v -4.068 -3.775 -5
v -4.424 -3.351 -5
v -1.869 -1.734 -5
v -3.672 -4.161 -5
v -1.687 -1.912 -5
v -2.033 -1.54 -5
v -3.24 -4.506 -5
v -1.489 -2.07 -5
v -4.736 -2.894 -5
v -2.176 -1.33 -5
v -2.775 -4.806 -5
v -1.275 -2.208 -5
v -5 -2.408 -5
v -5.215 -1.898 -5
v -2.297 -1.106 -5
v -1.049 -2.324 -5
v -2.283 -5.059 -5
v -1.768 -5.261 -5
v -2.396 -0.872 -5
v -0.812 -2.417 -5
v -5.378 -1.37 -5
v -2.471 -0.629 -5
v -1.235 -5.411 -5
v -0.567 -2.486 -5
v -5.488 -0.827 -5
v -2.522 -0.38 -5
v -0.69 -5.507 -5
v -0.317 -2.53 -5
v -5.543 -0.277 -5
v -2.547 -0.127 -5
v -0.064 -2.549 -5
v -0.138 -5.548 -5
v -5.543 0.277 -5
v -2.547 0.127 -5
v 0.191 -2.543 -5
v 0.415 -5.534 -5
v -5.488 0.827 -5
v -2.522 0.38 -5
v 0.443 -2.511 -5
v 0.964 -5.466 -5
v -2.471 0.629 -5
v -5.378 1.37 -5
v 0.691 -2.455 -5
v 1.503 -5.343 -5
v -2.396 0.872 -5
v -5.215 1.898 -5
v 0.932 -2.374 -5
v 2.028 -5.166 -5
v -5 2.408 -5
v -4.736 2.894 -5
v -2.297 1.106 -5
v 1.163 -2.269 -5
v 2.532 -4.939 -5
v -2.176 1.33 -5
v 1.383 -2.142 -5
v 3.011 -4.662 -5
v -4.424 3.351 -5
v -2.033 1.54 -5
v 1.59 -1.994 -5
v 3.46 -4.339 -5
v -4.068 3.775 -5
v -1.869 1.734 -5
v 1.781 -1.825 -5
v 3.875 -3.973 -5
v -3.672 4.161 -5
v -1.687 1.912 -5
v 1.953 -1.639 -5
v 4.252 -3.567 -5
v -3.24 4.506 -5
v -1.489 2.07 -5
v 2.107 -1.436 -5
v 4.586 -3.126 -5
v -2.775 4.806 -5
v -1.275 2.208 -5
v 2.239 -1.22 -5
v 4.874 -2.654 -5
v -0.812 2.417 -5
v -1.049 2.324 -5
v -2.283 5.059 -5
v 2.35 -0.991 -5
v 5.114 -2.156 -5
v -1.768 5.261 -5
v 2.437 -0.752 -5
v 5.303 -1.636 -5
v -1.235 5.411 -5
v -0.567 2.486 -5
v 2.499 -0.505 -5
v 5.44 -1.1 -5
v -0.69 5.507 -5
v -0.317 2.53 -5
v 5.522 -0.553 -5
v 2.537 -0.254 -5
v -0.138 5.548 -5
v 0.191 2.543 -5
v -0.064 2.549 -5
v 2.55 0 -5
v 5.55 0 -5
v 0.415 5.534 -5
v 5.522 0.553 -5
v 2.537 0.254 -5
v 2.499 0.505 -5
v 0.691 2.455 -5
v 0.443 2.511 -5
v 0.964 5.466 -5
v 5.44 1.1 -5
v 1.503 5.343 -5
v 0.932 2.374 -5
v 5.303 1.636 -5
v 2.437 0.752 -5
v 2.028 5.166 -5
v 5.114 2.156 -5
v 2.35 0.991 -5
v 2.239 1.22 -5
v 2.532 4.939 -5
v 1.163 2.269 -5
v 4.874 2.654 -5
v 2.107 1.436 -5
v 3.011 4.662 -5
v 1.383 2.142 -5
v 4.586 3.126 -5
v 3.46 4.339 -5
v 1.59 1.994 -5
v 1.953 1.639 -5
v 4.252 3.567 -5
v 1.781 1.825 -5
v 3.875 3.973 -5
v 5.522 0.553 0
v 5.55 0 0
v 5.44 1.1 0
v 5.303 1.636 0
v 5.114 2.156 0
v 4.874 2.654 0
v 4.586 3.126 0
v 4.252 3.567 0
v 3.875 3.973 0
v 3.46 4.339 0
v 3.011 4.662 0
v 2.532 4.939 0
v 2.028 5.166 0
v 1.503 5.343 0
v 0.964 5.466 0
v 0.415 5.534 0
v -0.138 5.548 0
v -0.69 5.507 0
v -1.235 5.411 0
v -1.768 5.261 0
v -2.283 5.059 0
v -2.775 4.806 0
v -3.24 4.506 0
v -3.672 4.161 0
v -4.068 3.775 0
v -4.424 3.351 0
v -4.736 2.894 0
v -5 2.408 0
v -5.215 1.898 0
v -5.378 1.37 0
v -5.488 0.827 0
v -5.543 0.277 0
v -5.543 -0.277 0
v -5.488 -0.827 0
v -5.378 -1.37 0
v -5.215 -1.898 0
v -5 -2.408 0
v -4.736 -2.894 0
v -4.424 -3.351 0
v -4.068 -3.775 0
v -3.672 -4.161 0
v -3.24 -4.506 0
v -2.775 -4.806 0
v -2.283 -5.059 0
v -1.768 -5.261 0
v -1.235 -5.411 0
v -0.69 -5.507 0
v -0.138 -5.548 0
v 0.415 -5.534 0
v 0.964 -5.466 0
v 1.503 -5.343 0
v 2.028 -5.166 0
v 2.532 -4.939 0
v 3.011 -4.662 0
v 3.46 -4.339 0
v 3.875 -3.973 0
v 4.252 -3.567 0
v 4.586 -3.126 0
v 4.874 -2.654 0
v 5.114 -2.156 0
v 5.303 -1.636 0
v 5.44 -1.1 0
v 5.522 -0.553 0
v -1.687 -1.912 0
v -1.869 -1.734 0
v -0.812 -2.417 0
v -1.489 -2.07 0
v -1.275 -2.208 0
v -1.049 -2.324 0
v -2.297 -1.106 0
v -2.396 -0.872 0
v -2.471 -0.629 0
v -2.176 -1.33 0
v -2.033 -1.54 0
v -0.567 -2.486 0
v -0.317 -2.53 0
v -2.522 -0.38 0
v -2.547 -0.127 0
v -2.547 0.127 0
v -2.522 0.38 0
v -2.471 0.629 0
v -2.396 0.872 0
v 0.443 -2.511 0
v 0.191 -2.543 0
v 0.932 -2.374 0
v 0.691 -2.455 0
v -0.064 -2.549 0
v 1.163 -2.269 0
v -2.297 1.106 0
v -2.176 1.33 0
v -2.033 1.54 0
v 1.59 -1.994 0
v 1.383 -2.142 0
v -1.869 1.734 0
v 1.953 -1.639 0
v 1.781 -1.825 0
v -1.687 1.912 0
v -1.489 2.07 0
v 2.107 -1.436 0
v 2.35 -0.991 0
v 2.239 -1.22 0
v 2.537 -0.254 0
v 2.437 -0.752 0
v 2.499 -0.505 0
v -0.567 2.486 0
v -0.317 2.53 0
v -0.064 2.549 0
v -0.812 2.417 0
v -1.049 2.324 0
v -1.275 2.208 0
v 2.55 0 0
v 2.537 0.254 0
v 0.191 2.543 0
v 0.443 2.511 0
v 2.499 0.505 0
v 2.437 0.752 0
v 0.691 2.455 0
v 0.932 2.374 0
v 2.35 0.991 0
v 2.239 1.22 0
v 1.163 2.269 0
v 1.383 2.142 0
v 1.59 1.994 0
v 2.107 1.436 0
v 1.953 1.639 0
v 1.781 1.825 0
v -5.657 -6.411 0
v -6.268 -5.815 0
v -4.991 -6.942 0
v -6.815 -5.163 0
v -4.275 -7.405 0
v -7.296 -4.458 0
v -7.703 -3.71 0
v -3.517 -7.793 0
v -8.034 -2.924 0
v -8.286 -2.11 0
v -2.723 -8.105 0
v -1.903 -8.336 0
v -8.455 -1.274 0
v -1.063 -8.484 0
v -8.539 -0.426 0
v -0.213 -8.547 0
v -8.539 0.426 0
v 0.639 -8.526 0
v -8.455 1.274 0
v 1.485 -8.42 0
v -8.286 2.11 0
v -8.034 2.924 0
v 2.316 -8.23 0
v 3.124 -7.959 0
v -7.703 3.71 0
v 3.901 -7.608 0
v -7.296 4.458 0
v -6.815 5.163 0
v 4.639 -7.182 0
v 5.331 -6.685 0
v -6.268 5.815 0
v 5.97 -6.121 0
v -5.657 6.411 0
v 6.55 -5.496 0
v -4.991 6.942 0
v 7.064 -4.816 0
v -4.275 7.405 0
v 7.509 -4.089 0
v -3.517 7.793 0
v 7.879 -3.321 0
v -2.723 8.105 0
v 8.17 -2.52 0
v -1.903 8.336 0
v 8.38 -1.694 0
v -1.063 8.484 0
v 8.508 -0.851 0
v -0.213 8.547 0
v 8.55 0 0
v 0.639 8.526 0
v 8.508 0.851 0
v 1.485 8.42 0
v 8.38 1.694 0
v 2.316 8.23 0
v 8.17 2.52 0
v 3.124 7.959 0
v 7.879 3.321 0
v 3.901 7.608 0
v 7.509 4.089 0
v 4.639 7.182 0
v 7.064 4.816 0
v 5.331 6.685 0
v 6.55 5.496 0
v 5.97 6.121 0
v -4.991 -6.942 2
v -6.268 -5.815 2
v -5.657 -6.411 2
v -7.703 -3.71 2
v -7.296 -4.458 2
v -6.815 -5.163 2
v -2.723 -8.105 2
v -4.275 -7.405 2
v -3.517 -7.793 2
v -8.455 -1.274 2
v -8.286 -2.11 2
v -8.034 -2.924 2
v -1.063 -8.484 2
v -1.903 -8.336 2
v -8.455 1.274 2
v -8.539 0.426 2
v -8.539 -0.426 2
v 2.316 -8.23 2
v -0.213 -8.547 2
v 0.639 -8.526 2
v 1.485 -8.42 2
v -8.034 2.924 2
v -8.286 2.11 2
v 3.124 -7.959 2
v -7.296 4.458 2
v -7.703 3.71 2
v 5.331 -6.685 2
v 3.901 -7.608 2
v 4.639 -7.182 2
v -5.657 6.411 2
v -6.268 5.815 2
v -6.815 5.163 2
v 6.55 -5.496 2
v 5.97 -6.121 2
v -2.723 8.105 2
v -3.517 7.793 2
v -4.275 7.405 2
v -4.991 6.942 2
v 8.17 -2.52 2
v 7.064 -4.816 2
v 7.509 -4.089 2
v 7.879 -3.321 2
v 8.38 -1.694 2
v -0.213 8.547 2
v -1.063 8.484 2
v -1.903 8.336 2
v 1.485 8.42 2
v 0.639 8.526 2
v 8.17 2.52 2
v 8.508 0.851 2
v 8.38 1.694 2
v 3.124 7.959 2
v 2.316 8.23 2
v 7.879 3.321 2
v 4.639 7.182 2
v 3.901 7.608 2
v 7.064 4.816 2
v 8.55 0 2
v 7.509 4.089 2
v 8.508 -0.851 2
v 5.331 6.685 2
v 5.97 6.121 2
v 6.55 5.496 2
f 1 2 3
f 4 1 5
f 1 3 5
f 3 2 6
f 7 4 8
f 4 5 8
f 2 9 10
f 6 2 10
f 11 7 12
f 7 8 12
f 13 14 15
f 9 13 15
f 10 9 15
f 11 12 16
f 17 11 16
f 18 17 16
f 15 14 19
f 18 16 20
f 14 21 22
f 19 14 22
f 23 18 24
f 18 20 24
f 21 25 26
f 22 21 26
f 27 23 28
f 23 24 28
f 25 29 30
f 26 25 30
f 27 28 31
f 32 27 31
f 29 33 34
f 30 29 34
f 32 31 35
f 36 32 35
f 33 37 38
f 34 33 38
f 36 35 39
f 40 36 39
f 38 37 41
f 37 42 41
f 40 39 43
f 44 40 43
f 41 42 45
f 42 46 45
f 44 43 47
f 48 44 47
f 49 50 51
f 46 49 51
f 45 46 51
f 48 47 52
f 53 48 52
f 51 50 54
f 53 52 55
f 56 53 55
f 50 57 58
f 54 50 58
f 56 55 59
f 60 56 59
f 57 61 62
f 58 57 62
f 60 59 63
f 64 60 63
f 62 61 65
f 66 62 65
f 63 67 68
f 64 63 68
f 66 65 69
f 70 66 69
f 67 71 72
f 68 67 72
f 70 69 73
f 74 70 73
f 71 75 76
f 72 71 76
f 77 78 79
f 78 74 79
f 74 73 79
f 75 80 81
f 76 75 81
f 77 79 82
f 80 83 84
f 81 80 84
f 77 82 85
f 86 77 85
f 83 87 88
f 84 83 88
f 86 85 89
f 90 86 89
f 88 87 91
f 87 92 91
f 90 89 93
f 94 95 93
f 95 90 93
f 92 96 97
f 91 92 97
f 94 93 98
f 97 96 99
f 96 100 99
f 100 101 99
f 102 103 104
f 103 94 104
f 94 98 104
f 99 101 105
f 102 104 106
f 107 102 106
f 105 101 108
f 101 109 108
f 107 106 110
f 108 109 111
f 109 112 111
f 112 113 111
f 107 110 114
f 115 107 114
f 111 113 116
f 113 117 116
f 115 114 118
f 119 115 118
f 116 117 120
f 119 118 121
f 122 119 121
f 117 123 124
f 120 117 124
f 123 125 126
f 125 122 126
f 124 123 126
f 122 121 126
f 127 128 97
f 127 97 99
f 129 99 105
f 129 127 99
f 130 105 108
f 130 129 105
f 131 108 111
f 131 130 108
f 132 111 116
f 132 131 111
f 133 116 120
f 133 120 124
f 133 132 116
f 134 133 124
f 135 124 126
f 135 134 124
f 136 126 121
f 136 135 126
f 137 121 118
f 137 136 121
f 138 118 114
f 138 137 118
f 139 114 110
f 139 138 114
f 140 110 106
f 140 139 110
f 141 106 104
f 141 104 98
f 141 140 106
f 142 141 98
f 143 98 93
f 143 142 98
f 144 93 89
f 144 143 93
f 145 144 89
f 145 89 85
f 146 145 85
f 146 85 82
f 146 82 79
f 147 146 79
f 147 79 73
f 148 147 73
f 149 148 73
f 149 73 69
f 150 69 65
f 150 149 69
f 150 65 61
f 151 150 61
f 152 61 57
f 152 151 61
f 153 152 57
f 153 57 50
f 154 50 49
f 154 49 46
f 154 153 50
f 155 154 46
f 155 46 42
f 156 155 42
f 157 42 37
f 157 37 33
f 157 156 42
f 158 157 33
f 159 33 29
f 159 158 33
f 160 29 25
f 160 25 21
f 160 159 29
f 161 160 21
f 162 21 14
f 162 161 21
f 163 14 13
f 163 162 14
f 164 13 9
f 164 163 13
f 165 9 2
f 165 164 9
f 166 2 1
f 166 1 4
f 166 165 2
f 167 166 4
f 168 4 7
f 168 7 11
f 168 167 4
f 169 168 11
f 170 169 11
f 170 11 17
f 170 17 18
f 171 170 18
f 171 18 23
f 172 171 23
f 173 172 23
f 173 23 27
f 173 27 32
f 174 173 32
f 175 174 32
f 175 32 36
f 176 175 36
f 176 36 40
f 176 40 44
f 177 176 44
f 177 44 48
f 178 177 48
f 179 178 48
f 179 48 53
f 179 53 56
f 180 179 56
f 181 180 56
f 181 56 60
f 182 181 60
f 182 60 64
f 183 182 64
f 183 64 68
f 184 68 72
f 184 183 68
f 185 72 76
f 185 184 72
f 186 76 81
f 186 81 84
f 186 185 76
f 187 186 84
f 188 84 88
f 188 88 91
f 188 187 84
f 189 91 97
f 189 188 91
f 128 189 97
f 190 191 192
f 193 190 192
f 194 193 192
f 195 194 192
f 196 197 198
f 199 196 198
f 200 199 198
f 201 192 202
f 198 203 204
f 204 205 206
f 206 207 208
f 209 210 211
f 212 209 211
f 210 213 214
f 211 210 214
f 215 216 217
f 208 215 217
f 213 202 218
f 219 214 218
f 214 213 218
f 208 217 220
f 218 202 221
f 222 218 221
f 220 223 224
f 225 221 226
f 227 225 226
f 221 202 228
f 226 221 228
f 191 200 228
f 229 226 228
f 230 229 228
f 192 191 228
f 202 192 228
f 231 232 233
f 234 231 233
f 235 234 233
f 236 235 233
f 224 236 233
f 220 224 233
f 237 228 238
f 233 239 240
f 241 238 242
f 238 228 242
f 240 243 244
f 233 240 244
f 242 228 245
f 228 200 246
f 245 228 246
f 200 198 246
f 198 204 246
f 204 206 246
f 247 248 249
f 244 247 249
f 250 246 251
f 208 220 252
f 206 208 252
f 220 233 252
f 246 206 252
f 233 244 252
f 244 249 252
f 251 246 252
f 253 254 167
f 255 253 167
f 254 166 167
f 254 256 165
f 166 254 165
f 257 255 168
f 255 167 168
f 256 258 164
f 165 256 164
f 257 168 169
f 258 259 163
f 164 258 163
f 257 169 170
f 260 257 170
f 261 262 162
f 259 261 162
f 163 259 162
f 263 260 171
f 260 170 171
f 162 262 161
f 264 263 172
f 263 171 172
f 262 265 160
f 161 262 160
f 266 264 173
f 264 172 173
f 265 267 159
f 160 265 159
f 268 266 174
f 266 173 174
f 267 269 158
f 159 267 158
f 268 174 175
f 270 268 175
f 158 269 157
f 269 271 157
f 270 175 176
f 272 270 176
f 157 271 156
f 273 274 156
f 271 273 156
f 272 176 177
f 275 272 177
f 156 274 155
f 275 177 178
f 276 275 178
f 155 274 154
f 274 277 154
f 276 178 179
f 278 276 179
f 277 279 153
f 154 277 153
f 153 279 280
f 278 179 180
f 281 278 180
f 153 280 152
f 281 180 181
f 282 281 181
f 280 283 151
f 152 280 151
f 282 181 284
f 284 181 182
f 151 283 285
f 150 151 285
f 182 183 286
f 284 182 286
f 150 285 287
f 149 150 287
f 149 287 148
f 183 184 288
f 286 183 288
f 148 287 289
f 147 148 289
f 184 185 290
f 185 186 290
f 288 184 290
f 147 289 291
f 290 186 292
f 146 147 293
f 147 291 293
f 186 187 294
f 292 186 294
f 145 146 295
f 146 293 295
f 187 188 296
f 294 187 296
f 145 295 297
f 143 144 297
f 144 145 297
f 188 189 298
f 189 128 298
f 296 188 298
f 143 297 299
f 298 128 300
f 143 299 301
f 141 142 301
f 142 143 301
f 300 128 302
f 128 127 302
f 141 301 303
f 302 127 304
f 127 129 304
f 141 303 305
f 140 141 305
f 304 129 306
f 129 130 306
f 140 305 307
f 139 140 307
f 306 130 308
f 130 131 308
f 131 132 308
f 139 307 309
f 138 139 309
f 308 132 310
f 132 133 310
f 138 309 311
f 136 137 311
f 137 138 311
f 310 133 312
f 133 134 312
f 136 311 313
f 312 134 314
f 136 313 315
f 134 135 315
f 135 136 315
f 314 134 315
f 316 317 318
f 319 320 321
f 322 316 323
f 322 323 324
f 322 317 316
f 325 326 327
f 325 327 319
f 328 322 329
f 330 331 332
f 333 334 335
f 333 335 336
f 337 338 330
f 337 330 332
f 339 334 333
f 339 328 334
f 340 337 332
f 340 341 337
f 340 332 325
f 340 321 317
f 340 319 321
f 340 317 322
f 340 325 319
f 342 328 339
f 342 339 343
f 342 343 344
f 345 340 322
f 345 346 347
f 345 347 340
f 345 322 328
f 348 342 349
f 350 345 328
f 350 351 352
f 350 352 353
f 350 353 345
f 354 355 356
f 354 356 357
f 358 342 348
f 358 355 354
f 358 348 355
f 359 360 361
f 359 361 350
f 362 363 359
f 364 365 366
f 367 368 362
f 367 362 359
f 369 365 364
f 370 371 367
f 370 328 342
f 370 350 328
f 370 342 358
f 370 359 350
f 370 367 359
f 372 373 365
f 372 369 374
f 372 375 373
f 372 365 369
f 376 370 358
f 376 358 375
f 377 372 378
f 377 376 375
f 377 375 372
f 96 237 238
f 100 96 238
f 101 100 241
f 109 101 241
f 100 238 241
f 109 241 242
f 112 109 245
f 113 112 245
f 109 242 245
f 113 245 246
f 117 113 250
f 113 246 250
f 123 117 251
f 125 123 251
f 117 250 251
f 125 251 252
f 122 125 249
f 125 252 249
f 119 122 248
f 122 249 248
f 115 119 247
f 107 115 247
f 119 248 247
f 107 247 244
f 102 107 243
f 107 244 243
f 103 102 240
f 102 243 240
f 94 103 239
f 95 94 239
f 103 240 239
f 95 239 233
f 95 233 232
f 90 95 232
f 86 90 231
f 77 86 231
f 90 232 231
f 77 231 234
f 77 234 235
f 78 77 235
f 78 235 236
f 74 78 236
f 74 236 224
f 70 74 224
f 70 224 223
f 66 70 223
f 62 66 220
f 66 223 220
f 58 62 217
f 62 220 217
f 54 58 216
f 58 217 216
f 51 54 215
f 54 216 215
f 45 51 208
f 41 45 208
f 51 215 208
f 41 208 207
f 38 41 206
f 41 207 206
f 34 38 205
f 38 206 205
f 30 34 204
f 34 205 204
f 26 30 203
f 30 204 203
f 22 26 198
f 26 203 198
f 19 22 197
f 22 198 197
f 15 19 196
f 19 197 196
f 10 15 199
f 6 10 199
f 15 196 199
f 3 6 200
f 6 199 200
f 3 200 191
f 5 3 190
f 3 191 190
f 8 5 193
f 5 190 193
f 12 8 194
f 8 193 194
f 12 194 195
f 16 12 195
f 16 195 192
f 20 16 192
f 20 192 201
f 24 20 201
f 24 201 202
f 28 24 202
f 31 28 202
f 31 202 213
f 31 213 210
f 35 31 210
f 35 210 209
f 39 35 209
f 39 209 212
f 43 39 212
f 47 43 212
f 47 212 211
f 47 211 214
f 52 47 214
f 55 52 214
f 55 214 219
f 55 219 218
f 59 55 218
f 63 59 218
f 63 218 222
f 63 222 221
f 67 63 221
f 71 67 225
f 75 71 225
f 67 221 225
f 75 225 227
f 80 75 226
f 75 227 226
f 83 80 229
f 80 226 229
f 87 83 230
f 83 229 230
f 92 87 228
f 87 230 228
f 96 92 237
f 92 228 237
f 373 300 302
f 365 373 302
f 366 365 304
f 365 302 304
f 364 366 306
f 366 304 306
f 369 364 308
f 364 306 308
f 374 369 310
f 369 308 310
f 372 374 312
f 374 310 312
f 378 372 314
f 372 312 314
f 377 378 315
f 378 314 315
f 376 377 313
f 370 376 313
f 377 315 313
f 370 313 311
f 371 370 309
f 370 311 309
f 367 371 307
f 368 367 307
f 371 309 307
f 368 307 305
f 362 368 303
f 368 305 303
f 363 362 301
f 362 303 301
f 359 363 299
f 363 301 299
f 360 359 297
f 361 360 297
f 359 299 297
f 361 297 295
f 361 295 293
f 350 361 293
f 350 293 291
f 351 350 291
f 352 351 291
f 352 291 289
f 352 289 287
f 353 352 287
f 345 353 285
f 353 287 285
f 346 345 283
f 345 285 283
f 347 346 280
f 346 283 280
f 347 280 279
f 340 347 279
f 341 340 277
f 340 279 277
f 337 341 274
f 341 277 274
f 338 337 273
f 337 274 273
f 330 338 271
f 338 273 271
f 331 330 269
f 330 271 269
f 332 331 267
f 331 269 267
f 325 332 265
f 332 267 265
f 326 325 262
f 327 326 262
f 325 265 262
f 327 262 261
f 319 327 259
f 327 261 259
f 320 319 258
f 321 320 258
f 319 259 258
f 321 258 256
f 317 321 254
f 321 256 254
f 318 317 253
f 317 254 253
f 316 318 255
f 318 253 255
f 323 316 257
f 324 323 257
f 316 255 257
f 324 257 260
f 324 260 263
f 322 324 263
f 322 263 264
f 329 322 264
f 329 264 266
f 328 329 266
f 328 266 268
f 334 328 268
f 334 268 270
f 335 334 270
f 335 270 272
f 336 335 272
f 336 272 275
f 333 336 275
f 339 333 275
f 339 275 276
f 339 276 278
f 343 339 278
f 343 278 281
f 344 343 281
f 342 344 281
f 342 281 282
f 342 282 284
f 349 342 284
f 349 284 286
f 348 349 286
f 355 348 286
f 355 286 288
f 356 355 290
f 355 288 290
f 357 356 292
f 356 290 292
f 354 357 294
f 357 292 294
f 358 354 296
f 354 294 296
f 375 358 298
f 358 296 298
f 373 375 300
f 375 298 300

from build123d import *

# Parameters (mm, degrees)
SKETCH1_R           = 5.55
SKETCH1_R_2         = 2.55
BOSS_EXTRUDE1_DEPTH = 5
SKETCH2_R           = 8.55
BOSS_EXTRUDE2_DEPTH = 2


with BuildPart() as part:
    # Sketch1 → Boss-Extrude1 (new body)
    with BuildSketch(Plane.XY):
        Circle(SKETCH1_R)
        Circle(SKETCH1_R_2, mode=Mode.SUBTRACT)
    extrude(amount=-BOSS_EXTRUDE1_DEPTH)

    # Sketch2 → Boss-Extrude2 (add)
    with BuildSketch(Plane.XY):
        Circle(SKETCH2_R)
    extrude(amount=BOSS_EXTRUDE2_DEPTH)


solid = part.part
